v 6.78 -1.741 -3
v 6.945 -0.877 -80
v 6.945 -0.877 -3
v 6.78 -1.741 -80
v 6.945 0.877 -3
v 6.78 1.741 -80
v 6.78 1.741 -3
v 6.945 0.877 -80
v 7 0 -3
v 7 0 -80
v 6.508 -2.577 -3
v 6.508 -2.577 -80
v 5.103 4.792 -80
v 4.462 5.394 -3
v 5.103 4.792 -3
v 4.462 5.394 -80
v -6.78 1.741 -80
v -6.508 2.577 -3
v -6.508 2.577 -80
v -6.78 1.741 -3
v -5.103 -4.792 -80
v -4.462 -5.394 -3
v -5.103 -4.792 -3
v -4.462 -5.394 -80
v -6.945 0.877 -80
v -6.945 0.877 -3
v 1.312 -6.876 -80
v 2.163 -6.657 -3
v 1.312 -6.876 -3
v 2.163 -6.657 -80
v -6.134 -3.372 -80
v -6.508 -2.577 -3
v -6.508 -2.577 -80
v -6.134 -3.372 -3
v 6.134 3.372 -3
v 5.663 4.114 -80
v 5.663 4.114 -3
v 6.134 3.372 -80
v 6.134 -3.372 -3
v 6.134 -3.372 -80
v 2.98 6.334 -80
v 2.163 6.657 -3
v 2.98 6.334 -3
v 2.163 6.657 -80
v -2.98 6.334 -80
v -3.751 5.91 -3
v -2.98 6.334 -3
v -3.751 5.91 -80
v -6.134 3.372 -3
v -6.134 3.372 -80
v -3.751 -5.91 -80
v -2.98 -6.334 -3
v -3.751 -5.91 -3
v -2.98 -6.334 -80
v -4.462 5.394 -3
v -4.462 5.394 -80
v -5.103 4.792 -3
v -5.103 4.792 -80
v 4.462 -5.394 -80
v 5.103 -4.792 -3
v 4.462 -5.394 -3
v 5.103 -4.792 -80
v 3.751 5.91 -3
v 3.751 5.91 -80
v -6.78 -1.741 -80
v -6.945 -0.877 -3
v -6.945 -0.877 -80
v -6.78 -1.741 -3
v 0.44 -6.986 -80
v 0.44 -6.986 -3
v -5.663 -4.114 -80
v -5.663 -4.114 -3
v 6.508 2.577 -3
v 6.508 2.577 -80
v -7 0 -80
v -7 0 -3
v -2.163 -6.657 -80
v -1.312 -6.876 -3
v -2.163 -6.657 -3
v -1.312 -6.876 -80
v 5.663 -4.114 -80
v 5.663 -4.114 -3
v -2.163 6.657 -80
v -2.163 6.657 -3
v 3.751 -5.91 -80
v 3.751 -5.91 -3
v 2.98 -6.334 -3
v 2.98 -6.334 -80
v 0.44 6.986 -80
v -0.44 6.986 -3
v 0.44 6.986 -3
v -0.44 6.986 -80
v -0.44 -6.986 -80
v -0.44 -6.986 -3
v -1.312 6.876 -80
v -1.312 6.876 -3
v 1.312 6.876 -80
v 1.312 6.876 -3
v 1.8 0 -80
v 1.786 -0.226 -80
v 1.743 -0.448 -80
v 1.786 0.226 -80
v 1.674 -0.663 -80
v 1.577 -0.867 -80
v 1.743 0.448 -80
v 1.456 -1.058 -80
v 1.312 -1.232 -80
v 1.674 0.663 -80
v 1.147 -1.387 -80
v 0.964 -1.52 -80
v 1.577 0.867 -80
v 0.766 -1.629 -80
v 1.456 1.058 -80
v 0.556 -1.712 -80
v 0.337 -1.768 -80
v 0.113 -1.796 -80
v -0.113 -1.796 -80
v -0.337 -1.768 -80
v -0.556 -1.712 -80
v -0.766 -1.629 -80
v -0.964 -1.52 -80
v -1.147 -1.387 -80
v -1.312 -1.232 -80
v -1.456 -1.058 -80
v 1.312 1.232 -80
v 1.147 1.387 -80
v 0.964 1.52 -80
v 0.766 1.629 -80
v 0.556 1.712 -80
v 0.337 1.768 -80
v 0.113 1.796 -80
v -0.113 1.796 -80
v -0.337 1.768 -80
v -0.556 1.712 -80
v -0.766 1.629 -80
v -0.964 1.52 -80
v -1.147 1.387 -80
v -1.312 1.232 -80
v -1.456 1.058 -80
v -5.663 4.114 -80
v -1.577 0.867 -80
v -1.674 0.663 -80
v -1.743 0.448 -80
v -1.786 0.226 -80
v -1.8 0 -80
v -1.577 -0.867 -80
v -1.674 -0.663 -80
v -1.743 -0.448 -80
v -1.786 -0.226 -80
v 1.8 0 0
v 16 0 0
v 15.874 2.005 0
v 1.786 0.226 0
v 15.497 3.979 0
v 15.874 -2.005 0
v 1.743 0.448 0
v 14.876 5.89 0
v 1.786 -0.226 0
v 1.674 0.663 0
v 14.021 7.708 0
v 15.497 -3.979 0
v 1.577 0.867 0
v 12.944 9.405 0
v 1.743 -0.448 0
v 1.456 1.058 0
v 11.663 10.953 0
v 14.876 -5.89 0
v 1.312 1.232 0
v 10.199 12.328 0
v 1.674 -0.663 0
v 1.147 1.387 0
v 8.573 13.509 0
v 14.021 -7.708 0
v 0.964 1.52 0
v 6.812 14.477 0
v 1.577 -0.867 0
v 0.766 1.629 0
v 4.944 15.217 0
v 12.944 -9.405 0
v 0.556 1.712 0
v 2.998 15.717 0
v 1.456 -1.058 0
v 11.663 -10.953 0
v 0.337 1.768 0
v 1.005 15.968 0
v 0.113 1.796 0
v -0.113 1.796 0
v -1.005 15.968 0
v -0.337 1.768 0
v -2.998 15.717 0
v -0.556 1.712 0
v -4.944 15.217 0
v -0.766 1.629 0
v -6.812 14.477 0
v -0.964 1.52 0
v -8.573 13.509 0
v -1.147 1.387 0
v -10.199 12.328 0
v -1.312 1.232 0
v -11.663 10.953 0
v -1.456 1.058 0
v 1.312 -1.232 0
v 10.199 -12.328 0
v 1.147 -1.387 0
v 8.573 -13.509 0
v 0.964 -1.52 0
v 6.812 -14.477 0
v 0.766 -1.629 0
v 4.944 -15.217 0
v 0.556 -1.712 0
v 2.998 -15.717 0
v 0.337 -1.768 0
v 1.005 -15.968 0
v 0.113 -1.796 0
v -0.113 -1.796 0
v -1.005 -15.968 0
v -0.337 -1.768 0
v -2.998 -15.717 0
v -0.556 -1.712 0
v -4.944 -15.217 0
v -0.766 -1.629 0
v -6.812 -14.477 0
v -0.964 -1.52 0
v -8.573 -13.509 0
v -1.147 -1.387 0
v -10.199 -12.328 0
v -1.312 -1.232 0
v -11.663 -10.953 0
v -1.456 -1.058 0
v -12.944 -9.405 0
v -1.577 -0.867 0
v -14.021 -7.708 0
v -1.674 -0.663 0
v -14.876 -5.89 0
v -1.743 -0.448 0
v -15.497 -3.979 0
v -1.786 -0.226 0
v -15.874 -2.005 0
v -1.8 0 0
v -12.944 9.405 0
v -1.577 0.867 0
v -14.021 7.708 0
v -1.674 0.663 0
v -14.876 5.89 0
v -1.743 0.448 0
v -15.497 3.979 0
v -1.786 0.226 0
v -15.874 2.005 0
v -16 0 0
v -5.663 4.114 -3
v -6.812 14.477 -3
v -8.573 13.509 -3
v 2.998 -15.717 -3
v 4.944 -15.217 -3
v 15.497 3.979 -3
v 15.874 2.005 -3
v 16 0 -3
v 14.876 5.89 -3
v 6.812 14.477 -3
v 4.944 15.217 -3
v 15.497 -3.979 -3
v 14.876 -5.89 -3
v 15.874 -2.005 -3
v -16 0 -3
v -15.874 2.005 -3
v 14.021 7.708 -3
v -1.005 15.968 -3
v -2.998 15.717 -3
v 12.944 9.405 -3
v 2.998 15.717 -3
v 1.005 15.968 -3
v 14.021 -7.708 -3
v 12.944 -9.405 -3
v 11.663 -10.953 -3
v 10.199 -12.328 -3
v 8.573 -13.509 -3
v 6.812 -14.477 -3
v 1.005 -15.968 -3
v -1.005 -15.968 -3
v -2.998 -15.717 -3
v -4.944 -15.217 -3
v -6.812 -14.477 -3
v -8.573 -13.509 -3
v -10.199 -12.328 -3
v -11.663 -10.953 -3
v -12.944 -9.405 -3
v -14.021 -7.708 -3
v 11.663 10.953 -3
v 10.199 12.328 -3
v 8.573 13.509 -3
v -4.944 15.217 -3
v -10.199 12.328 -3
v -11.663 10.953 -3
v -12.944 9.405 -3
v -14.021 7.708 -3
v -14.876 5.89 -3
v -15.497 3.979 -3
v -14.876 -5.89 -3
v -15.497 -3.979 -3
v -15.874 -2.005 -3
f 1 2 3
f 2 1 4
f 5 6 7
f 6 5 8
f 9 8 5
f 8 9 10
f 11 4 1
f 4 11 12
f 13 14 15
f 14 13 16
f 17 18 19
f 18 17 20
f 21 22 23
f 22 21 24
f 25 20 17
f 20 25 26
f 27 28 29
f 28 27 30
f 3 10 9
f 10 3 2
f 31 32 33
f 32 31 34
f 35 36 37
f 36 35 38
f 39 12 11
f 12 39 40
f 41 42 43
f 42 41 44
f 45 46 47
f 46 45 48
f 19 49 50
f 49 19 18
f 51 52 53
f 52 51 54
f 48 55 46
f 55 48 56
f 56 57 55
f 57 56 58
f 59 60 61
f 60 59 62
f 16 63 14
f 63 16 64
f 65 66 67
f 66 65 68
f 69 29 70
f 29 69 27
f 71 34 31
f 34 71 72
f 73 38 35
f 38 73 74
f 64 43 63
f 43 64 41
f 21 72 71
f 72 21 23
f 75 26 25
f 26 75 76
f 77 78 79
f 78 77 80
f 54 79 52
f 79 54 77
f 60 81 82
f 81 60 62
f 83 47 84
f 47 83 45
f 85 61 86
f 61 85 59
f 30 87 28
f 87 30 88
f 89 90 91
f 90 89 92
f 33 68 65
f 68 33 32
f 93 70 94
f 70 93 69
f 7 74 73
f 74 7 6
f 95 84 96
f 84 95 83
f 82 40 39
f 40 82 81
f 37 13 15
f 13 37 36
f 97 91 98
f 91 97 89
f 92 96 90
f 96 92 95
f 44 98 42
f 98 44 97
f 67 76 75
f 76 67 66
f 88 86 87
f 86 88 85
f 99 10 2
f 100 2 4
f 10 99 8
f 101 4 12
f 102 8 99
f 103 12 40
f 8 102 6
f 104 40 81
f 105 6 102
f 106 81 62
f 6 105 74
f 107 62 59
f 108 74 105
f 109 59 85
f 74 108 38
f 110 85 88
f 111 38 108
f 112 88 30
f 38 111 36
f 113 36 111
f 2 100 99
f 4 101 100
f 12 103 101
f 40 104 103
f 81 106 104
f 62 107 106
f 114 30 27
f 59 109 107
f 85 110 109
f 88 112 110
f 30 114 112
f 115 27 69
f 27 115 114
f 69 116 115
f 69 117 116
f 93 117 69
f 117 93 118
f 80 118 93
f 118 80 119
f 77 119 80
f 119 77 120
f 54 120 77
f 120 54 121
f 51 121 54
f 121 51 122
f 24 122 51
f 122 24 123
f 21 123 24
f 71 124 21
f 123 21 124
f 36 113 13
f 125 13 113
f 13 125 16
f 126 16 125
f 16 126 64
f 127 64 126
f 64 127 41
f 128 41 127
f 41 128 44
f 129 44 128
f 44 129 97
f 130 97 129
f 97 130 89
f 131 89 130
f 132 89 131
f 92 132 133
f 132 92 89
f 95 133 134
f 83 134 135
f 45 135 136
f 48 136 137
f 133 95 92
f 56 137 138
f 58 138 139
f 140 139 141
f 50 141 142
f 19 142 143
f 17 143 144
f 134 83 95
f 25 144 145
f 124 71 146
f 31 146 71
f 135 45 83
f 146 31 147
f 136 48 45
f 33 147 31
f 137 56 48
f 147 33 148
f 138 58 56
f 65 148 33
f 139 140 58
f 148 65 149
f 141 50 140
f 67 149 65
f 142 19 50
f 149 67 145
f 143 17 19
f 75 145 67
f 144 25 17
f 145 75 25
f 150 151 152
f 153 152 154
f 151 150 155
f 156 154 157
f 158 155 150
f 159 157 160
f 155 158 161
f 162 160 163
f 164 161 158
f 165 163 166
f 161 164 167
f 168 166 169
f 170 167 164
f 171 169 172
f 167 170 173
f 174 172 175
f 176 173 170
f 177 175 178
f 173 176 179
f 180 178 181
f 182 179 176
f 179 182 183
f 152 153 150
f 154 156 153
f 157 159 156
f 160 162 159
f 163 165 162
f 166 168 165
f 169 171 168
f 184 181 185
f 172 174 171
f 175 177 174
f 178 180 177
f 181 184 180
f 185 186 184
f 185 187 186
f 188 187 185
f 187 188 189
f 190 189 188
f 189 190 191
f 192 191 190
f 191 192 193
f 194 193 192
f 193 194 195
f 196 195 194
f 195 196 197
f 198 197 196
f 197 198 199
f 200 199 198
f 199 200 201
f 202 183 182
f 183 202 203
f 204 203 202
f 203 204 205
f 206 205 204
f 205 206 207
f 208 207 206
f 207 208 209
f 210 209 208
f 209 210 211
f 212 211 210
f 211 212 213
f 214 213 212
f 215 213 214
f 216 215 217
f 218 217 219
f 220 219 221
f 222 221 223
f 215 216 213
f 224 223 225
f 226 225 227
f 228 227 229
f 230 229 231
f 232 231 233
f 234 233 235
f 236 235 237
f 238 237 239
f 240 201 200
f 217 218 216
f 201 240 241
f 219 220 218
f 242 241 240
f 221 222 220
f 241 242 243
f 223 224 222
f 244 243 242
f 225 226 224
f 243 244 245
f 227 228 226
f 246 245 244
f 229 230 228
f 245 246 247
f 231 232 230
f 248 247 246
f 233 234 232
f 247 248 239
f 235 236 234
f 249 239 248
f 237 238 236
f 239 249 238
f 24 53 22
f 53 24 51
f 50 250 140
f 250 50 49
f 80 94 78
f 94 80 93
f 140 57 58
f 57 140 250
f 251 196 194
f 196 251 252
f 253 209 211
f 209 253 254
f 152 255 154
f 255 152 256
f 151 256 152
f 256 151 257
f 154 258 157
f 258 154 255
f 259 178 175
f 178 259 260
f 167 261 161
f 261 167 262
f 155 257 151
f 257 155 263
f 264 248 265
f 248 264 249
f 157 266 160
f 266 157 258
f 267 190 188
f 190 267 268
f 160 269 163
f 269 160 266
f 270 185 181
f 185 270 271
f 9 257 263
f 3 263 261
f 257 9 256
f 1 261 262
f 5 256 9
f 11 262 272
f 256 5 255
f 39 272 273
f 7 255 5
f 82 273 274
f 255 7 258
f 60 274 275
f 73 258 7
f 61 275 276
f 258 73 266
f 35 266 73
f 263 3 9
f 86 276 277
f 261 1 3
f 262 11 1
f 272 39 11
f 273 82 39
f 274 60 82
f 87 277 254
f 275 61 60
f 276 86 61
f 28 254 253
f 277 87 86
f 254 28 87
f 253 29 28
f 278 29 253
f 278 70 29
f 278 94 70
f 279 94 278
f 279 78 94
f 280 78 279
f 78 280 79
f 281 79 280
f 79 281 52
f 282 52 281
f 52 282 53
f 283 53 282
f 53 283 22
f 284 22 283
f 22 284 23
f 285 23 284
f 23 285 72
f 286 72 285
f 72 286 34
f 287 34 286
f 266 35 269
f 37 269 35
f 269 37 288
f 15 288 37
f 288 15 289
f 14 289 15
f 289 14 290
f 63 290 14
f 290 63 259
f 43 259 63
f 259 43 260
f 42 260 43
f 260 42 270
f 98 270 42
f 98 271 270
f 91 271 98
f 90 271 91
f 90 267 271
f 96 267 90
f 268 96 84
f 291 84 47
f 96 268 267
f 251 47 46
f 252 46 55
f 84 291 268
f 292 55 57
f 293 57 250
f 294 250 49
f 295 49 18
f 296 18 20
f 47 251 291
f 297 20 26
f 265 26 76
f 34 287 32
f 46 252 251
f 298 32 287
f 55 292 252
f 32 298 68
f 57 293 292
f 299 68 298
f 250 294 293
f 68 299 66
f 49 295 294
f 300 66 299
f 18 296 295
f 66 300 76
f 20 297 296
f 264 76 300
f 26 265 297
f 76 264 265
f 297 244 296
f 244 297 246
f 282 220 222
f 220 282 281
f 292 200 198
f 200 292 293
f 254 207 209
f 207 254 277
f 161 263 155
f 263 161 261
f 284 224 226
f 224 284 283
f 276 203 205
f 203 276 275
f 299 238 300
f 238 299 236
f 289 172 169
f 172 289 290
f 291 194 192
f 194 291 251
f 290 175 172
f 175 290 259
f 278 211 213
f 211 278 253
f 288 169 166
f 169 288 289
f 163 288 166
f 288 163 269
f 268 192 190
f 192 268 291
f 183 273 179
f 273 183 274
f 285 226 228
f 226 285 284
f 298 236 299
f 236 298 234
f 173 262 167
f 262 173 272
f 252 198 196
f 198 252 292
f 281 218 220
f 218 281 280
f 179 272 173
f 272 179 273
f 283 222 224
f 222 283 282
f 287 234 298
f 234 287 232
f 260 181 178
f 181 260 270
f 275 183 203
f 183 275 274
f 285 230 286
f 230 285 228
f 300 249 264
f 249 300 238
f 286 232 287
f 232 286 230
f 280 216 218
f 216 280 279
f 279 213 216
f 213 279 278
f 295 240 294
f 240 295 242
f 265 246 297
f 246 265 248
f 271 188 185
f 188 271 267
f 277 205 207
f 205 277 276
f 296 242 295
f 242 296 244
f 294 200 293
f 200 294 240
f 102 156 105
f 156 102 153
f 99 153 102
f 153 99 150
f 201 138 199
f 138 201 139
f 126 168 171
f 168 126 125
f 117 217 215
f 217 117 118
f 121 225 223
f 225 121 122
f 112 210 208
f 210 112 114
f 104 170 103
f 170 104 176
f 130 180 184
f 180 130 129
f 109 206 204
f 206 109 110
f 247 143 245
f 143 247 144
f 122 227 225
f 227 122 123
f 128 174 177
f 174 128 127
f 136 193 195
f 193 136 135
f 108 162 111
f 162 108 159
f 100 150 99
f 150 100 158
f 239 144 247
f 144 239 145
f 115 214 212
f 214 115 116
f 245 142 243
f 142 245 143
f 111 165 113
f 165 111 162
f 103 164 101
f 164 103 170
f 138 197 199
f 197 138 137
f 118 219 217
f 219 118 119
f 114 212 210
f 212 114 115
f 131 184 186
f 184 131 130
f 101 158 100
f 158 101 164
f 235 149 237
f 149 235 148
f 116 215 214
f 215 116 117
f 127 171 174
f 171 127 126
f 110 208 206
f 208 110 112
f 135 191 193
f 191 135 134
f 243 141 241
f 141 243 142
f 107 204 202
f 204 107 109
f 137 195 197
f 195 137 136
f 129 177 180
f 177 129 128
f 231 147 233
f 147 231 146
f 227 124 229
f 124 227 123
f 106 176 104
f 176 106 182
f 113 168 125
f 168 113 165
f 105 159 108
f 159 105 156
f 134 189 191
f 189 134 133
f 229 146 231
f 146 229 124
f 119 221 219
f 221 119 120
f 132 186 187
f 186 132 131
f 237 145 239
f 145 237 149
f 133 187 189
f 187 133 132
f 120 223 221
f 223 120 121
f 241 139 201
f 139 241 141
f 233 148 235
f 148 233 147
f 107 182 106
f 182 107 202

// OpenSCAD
$fn = 50;


difference() {
	union() {
		translate(v = [0, 0, -80.0000000000]) {
			cylinder(h = 80, r = 7.0000000000);
		}
		translate(v = [0, 0, -3.0000000000]) {
			cylinder(h = 3, r = 16.0000000000);
		}
	}
	union() {
		#translate(v = [0, 0, -80]) {
			cylinder(h = 80, r = 1.8000000000);
		}
	}
}
